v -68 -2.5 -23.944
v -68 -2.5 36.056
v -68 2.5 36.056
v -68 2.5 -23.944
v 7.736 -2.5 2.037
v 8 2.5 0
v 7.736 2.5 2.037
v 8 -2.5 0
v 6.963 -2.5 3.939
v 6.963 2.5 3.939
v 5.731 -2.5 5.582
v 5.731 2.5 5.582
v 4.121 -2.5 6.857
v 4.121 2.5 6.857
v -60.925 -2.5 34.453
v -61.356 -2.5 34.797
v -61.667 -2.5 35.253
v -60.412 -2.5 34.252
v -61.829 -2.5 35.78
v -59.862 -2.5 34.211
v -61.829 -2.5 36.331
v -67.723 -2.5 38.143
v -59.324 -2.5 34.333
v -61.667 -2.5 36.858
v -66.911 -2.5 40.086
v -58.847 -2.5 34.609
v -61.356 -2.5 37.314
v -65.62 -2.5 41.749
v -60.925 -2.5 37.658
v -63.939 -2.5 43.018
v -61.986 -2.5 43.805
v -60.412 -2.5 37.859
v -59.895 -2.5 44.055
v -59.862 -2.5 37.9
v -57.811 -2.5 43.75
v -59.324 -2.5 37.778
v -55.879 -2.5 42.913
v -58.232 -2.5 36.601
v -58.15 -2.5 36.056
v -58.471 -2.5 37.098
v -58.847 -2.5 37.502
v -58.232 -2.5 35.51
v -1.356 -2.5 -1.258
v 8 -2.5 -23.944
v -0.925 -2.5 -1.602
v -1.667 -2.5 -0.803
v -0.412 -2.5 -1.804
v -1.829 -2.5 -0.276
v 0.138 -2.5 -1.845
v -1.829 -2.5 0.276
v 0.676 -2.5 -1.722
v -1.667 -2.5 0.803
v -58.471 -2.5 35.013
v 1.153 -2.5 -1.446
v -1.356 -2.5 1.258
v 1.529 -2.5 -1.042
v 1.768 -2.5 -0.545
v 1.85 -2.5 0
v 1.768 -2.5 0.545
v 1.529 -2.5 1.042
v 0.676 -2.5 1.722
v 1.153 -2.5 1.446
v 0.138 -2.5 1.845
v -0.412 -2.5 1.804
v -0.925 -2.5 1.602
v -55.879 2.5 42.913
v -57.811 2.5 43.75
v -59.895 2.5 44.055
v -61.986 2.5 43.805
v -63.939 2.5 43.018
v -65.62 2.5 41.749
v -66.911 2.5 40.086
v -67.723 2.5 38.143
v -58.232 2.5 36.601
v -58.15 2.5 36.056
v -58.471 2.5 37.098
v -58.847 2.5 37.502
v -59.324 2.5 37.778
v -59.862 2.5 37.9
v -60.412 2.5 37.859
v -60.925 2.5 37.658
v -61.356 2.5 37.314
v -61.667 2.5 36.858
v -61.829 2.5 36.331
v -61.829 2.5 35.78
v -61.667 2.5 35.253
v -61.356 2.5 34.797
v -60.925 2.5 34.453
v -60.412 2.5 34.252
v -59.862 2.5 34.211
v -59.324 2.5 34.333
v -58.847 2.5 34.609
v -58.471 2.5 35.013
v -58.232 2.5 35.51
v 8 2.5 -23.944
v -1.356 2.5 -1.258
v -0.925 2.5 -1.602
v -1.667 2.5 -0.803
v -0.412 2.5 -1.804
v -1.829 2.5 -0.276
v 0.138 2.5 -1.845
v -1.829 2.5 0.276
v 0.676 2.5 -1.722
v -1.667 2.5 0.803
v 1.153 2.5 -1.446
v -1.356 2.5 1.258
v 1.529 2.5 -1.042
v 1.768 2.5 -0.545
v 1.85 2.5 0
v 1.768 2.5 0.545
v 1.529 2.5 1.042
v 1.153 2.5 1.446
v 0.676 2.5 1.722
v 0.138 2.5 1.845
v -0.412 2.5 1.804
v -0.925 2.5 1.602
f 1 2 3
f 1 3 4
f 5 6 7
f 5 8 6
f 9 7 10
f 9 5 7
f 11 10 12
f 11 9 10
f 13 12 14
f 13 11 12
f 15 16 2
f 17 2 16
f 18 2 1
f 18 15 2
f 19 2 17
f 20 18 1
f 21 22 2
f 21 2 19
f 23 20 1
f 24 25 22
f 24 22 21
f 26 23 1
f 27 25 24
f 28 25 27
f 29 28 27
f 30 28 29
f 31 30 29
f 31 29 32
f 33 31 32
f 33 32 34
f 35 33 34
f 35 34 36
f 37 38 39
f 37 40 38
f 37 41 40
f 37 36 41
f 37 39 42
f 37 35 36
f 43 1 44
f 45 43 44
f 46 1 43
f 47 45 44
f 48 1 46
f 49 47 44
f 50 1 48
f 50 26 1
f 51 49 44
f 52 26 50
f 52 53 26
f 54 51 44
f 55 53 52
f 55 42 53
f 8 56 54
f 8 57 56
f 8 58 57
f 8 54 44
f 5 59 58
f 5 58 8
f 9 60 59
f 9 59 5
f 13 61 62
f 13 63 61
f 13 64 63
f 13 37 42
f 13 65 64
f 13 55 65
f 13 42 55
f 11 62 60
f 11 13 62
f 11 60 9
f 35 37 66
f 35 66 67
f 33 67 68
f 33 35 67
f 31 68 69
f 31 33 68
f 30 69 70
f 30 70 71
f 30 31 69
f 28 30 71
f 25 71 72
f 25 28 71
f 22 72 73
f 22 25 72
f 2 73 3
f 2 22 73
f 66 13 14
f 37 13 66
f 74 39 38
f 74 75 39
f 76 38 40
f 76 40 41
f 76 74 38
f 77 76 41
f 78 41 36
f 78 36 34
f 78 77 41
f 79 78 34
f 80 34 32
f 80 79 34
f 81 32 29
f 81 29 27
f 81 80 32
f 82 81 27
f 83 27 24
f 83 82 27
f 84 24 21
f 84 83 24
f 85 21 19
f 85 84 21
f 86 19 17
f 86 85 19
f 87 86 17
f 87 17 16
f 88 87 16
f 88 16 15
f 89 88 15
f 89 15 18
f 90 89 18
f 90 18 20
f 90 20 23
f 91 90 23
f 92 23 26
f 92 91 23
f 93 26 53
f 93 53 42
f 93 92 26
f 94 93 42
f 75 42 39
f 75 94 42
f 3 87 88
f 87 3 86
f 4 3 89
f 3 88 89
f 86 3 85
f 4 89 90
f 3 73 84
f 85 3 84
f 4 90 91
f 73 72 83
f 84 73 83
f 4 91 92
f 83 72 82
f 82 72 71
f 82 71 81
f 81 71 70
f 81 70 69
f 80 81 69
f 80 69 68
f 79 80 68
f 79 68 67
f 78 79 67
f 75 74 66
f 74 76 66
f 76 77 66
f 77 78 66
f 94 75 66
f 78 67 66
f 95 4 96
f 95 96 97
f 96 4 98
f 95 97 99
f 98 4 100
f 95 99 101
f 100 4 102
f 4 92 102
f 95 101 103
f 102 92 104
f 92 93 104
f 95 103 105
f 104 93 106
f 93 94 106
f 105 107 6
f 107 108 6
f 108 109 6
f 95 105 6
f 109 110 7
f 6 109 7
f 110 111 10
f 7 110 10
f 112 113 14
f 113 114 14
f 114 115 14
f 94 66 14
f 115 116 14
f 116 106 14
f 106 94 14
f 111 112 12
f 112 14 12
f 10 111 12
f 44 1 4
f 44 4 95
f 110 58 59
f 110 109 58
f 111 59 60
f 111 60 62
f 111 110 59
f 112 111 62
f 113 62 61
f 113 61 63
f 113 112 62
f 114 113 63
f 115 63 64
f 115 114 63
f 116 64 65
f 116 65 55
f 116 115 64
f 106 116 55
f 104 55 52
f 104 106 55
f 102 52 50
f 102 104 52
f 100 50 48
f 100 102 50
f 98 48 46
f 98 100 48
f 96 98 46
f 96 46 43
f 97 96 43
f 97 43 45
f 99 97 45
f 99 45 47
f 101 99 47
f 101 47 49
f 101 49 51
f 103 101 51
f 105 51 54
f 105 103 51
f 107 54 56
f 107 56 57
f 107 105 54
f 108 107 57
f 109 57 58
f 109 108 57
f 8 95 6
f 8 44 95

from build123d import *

# Parameters (mm, degrees)
F0_R     = 1.85
F1_DEPTH = 2.5


# Not quite as in the source:
# - a feature names something its author has since deleted; it is built from what else it names


with BuildPart() as f1:
    # F0 (on Front) → F1 (new body, symmetric)
    with BuildSketch(Plane.XZ):
        with BuildLine():
            Line((4.1206300291, 6.8571428571), (-55.8793699709, 42.9126556118))
            ThreePointArc((-55.8793699709, 42.9126556118), (-63.9392232589, 43.0184517976), (-68, 36.0555127546))
            Line((-68, 36.0555127546), (-68, -23.9444872454))
            Line((-68, -23.9444872454), (8, -23.9444872454))
            Line((8, -23.9444872454), (8, 0))
            ThreePointArc((8, 0), (6.962939043, 3.9392232589), (4.1206300291, 6.8571428571))
        make_face()
        Circle(F0_R, mode=Mode.SUBTRACT)
        with Locations((-60, 36.0555127546)):
            Circle(F0_R, mode=Mode.SUBTRACT)
    extrude(amount=F1_DEPTH, both=True)


solid = f1.part
